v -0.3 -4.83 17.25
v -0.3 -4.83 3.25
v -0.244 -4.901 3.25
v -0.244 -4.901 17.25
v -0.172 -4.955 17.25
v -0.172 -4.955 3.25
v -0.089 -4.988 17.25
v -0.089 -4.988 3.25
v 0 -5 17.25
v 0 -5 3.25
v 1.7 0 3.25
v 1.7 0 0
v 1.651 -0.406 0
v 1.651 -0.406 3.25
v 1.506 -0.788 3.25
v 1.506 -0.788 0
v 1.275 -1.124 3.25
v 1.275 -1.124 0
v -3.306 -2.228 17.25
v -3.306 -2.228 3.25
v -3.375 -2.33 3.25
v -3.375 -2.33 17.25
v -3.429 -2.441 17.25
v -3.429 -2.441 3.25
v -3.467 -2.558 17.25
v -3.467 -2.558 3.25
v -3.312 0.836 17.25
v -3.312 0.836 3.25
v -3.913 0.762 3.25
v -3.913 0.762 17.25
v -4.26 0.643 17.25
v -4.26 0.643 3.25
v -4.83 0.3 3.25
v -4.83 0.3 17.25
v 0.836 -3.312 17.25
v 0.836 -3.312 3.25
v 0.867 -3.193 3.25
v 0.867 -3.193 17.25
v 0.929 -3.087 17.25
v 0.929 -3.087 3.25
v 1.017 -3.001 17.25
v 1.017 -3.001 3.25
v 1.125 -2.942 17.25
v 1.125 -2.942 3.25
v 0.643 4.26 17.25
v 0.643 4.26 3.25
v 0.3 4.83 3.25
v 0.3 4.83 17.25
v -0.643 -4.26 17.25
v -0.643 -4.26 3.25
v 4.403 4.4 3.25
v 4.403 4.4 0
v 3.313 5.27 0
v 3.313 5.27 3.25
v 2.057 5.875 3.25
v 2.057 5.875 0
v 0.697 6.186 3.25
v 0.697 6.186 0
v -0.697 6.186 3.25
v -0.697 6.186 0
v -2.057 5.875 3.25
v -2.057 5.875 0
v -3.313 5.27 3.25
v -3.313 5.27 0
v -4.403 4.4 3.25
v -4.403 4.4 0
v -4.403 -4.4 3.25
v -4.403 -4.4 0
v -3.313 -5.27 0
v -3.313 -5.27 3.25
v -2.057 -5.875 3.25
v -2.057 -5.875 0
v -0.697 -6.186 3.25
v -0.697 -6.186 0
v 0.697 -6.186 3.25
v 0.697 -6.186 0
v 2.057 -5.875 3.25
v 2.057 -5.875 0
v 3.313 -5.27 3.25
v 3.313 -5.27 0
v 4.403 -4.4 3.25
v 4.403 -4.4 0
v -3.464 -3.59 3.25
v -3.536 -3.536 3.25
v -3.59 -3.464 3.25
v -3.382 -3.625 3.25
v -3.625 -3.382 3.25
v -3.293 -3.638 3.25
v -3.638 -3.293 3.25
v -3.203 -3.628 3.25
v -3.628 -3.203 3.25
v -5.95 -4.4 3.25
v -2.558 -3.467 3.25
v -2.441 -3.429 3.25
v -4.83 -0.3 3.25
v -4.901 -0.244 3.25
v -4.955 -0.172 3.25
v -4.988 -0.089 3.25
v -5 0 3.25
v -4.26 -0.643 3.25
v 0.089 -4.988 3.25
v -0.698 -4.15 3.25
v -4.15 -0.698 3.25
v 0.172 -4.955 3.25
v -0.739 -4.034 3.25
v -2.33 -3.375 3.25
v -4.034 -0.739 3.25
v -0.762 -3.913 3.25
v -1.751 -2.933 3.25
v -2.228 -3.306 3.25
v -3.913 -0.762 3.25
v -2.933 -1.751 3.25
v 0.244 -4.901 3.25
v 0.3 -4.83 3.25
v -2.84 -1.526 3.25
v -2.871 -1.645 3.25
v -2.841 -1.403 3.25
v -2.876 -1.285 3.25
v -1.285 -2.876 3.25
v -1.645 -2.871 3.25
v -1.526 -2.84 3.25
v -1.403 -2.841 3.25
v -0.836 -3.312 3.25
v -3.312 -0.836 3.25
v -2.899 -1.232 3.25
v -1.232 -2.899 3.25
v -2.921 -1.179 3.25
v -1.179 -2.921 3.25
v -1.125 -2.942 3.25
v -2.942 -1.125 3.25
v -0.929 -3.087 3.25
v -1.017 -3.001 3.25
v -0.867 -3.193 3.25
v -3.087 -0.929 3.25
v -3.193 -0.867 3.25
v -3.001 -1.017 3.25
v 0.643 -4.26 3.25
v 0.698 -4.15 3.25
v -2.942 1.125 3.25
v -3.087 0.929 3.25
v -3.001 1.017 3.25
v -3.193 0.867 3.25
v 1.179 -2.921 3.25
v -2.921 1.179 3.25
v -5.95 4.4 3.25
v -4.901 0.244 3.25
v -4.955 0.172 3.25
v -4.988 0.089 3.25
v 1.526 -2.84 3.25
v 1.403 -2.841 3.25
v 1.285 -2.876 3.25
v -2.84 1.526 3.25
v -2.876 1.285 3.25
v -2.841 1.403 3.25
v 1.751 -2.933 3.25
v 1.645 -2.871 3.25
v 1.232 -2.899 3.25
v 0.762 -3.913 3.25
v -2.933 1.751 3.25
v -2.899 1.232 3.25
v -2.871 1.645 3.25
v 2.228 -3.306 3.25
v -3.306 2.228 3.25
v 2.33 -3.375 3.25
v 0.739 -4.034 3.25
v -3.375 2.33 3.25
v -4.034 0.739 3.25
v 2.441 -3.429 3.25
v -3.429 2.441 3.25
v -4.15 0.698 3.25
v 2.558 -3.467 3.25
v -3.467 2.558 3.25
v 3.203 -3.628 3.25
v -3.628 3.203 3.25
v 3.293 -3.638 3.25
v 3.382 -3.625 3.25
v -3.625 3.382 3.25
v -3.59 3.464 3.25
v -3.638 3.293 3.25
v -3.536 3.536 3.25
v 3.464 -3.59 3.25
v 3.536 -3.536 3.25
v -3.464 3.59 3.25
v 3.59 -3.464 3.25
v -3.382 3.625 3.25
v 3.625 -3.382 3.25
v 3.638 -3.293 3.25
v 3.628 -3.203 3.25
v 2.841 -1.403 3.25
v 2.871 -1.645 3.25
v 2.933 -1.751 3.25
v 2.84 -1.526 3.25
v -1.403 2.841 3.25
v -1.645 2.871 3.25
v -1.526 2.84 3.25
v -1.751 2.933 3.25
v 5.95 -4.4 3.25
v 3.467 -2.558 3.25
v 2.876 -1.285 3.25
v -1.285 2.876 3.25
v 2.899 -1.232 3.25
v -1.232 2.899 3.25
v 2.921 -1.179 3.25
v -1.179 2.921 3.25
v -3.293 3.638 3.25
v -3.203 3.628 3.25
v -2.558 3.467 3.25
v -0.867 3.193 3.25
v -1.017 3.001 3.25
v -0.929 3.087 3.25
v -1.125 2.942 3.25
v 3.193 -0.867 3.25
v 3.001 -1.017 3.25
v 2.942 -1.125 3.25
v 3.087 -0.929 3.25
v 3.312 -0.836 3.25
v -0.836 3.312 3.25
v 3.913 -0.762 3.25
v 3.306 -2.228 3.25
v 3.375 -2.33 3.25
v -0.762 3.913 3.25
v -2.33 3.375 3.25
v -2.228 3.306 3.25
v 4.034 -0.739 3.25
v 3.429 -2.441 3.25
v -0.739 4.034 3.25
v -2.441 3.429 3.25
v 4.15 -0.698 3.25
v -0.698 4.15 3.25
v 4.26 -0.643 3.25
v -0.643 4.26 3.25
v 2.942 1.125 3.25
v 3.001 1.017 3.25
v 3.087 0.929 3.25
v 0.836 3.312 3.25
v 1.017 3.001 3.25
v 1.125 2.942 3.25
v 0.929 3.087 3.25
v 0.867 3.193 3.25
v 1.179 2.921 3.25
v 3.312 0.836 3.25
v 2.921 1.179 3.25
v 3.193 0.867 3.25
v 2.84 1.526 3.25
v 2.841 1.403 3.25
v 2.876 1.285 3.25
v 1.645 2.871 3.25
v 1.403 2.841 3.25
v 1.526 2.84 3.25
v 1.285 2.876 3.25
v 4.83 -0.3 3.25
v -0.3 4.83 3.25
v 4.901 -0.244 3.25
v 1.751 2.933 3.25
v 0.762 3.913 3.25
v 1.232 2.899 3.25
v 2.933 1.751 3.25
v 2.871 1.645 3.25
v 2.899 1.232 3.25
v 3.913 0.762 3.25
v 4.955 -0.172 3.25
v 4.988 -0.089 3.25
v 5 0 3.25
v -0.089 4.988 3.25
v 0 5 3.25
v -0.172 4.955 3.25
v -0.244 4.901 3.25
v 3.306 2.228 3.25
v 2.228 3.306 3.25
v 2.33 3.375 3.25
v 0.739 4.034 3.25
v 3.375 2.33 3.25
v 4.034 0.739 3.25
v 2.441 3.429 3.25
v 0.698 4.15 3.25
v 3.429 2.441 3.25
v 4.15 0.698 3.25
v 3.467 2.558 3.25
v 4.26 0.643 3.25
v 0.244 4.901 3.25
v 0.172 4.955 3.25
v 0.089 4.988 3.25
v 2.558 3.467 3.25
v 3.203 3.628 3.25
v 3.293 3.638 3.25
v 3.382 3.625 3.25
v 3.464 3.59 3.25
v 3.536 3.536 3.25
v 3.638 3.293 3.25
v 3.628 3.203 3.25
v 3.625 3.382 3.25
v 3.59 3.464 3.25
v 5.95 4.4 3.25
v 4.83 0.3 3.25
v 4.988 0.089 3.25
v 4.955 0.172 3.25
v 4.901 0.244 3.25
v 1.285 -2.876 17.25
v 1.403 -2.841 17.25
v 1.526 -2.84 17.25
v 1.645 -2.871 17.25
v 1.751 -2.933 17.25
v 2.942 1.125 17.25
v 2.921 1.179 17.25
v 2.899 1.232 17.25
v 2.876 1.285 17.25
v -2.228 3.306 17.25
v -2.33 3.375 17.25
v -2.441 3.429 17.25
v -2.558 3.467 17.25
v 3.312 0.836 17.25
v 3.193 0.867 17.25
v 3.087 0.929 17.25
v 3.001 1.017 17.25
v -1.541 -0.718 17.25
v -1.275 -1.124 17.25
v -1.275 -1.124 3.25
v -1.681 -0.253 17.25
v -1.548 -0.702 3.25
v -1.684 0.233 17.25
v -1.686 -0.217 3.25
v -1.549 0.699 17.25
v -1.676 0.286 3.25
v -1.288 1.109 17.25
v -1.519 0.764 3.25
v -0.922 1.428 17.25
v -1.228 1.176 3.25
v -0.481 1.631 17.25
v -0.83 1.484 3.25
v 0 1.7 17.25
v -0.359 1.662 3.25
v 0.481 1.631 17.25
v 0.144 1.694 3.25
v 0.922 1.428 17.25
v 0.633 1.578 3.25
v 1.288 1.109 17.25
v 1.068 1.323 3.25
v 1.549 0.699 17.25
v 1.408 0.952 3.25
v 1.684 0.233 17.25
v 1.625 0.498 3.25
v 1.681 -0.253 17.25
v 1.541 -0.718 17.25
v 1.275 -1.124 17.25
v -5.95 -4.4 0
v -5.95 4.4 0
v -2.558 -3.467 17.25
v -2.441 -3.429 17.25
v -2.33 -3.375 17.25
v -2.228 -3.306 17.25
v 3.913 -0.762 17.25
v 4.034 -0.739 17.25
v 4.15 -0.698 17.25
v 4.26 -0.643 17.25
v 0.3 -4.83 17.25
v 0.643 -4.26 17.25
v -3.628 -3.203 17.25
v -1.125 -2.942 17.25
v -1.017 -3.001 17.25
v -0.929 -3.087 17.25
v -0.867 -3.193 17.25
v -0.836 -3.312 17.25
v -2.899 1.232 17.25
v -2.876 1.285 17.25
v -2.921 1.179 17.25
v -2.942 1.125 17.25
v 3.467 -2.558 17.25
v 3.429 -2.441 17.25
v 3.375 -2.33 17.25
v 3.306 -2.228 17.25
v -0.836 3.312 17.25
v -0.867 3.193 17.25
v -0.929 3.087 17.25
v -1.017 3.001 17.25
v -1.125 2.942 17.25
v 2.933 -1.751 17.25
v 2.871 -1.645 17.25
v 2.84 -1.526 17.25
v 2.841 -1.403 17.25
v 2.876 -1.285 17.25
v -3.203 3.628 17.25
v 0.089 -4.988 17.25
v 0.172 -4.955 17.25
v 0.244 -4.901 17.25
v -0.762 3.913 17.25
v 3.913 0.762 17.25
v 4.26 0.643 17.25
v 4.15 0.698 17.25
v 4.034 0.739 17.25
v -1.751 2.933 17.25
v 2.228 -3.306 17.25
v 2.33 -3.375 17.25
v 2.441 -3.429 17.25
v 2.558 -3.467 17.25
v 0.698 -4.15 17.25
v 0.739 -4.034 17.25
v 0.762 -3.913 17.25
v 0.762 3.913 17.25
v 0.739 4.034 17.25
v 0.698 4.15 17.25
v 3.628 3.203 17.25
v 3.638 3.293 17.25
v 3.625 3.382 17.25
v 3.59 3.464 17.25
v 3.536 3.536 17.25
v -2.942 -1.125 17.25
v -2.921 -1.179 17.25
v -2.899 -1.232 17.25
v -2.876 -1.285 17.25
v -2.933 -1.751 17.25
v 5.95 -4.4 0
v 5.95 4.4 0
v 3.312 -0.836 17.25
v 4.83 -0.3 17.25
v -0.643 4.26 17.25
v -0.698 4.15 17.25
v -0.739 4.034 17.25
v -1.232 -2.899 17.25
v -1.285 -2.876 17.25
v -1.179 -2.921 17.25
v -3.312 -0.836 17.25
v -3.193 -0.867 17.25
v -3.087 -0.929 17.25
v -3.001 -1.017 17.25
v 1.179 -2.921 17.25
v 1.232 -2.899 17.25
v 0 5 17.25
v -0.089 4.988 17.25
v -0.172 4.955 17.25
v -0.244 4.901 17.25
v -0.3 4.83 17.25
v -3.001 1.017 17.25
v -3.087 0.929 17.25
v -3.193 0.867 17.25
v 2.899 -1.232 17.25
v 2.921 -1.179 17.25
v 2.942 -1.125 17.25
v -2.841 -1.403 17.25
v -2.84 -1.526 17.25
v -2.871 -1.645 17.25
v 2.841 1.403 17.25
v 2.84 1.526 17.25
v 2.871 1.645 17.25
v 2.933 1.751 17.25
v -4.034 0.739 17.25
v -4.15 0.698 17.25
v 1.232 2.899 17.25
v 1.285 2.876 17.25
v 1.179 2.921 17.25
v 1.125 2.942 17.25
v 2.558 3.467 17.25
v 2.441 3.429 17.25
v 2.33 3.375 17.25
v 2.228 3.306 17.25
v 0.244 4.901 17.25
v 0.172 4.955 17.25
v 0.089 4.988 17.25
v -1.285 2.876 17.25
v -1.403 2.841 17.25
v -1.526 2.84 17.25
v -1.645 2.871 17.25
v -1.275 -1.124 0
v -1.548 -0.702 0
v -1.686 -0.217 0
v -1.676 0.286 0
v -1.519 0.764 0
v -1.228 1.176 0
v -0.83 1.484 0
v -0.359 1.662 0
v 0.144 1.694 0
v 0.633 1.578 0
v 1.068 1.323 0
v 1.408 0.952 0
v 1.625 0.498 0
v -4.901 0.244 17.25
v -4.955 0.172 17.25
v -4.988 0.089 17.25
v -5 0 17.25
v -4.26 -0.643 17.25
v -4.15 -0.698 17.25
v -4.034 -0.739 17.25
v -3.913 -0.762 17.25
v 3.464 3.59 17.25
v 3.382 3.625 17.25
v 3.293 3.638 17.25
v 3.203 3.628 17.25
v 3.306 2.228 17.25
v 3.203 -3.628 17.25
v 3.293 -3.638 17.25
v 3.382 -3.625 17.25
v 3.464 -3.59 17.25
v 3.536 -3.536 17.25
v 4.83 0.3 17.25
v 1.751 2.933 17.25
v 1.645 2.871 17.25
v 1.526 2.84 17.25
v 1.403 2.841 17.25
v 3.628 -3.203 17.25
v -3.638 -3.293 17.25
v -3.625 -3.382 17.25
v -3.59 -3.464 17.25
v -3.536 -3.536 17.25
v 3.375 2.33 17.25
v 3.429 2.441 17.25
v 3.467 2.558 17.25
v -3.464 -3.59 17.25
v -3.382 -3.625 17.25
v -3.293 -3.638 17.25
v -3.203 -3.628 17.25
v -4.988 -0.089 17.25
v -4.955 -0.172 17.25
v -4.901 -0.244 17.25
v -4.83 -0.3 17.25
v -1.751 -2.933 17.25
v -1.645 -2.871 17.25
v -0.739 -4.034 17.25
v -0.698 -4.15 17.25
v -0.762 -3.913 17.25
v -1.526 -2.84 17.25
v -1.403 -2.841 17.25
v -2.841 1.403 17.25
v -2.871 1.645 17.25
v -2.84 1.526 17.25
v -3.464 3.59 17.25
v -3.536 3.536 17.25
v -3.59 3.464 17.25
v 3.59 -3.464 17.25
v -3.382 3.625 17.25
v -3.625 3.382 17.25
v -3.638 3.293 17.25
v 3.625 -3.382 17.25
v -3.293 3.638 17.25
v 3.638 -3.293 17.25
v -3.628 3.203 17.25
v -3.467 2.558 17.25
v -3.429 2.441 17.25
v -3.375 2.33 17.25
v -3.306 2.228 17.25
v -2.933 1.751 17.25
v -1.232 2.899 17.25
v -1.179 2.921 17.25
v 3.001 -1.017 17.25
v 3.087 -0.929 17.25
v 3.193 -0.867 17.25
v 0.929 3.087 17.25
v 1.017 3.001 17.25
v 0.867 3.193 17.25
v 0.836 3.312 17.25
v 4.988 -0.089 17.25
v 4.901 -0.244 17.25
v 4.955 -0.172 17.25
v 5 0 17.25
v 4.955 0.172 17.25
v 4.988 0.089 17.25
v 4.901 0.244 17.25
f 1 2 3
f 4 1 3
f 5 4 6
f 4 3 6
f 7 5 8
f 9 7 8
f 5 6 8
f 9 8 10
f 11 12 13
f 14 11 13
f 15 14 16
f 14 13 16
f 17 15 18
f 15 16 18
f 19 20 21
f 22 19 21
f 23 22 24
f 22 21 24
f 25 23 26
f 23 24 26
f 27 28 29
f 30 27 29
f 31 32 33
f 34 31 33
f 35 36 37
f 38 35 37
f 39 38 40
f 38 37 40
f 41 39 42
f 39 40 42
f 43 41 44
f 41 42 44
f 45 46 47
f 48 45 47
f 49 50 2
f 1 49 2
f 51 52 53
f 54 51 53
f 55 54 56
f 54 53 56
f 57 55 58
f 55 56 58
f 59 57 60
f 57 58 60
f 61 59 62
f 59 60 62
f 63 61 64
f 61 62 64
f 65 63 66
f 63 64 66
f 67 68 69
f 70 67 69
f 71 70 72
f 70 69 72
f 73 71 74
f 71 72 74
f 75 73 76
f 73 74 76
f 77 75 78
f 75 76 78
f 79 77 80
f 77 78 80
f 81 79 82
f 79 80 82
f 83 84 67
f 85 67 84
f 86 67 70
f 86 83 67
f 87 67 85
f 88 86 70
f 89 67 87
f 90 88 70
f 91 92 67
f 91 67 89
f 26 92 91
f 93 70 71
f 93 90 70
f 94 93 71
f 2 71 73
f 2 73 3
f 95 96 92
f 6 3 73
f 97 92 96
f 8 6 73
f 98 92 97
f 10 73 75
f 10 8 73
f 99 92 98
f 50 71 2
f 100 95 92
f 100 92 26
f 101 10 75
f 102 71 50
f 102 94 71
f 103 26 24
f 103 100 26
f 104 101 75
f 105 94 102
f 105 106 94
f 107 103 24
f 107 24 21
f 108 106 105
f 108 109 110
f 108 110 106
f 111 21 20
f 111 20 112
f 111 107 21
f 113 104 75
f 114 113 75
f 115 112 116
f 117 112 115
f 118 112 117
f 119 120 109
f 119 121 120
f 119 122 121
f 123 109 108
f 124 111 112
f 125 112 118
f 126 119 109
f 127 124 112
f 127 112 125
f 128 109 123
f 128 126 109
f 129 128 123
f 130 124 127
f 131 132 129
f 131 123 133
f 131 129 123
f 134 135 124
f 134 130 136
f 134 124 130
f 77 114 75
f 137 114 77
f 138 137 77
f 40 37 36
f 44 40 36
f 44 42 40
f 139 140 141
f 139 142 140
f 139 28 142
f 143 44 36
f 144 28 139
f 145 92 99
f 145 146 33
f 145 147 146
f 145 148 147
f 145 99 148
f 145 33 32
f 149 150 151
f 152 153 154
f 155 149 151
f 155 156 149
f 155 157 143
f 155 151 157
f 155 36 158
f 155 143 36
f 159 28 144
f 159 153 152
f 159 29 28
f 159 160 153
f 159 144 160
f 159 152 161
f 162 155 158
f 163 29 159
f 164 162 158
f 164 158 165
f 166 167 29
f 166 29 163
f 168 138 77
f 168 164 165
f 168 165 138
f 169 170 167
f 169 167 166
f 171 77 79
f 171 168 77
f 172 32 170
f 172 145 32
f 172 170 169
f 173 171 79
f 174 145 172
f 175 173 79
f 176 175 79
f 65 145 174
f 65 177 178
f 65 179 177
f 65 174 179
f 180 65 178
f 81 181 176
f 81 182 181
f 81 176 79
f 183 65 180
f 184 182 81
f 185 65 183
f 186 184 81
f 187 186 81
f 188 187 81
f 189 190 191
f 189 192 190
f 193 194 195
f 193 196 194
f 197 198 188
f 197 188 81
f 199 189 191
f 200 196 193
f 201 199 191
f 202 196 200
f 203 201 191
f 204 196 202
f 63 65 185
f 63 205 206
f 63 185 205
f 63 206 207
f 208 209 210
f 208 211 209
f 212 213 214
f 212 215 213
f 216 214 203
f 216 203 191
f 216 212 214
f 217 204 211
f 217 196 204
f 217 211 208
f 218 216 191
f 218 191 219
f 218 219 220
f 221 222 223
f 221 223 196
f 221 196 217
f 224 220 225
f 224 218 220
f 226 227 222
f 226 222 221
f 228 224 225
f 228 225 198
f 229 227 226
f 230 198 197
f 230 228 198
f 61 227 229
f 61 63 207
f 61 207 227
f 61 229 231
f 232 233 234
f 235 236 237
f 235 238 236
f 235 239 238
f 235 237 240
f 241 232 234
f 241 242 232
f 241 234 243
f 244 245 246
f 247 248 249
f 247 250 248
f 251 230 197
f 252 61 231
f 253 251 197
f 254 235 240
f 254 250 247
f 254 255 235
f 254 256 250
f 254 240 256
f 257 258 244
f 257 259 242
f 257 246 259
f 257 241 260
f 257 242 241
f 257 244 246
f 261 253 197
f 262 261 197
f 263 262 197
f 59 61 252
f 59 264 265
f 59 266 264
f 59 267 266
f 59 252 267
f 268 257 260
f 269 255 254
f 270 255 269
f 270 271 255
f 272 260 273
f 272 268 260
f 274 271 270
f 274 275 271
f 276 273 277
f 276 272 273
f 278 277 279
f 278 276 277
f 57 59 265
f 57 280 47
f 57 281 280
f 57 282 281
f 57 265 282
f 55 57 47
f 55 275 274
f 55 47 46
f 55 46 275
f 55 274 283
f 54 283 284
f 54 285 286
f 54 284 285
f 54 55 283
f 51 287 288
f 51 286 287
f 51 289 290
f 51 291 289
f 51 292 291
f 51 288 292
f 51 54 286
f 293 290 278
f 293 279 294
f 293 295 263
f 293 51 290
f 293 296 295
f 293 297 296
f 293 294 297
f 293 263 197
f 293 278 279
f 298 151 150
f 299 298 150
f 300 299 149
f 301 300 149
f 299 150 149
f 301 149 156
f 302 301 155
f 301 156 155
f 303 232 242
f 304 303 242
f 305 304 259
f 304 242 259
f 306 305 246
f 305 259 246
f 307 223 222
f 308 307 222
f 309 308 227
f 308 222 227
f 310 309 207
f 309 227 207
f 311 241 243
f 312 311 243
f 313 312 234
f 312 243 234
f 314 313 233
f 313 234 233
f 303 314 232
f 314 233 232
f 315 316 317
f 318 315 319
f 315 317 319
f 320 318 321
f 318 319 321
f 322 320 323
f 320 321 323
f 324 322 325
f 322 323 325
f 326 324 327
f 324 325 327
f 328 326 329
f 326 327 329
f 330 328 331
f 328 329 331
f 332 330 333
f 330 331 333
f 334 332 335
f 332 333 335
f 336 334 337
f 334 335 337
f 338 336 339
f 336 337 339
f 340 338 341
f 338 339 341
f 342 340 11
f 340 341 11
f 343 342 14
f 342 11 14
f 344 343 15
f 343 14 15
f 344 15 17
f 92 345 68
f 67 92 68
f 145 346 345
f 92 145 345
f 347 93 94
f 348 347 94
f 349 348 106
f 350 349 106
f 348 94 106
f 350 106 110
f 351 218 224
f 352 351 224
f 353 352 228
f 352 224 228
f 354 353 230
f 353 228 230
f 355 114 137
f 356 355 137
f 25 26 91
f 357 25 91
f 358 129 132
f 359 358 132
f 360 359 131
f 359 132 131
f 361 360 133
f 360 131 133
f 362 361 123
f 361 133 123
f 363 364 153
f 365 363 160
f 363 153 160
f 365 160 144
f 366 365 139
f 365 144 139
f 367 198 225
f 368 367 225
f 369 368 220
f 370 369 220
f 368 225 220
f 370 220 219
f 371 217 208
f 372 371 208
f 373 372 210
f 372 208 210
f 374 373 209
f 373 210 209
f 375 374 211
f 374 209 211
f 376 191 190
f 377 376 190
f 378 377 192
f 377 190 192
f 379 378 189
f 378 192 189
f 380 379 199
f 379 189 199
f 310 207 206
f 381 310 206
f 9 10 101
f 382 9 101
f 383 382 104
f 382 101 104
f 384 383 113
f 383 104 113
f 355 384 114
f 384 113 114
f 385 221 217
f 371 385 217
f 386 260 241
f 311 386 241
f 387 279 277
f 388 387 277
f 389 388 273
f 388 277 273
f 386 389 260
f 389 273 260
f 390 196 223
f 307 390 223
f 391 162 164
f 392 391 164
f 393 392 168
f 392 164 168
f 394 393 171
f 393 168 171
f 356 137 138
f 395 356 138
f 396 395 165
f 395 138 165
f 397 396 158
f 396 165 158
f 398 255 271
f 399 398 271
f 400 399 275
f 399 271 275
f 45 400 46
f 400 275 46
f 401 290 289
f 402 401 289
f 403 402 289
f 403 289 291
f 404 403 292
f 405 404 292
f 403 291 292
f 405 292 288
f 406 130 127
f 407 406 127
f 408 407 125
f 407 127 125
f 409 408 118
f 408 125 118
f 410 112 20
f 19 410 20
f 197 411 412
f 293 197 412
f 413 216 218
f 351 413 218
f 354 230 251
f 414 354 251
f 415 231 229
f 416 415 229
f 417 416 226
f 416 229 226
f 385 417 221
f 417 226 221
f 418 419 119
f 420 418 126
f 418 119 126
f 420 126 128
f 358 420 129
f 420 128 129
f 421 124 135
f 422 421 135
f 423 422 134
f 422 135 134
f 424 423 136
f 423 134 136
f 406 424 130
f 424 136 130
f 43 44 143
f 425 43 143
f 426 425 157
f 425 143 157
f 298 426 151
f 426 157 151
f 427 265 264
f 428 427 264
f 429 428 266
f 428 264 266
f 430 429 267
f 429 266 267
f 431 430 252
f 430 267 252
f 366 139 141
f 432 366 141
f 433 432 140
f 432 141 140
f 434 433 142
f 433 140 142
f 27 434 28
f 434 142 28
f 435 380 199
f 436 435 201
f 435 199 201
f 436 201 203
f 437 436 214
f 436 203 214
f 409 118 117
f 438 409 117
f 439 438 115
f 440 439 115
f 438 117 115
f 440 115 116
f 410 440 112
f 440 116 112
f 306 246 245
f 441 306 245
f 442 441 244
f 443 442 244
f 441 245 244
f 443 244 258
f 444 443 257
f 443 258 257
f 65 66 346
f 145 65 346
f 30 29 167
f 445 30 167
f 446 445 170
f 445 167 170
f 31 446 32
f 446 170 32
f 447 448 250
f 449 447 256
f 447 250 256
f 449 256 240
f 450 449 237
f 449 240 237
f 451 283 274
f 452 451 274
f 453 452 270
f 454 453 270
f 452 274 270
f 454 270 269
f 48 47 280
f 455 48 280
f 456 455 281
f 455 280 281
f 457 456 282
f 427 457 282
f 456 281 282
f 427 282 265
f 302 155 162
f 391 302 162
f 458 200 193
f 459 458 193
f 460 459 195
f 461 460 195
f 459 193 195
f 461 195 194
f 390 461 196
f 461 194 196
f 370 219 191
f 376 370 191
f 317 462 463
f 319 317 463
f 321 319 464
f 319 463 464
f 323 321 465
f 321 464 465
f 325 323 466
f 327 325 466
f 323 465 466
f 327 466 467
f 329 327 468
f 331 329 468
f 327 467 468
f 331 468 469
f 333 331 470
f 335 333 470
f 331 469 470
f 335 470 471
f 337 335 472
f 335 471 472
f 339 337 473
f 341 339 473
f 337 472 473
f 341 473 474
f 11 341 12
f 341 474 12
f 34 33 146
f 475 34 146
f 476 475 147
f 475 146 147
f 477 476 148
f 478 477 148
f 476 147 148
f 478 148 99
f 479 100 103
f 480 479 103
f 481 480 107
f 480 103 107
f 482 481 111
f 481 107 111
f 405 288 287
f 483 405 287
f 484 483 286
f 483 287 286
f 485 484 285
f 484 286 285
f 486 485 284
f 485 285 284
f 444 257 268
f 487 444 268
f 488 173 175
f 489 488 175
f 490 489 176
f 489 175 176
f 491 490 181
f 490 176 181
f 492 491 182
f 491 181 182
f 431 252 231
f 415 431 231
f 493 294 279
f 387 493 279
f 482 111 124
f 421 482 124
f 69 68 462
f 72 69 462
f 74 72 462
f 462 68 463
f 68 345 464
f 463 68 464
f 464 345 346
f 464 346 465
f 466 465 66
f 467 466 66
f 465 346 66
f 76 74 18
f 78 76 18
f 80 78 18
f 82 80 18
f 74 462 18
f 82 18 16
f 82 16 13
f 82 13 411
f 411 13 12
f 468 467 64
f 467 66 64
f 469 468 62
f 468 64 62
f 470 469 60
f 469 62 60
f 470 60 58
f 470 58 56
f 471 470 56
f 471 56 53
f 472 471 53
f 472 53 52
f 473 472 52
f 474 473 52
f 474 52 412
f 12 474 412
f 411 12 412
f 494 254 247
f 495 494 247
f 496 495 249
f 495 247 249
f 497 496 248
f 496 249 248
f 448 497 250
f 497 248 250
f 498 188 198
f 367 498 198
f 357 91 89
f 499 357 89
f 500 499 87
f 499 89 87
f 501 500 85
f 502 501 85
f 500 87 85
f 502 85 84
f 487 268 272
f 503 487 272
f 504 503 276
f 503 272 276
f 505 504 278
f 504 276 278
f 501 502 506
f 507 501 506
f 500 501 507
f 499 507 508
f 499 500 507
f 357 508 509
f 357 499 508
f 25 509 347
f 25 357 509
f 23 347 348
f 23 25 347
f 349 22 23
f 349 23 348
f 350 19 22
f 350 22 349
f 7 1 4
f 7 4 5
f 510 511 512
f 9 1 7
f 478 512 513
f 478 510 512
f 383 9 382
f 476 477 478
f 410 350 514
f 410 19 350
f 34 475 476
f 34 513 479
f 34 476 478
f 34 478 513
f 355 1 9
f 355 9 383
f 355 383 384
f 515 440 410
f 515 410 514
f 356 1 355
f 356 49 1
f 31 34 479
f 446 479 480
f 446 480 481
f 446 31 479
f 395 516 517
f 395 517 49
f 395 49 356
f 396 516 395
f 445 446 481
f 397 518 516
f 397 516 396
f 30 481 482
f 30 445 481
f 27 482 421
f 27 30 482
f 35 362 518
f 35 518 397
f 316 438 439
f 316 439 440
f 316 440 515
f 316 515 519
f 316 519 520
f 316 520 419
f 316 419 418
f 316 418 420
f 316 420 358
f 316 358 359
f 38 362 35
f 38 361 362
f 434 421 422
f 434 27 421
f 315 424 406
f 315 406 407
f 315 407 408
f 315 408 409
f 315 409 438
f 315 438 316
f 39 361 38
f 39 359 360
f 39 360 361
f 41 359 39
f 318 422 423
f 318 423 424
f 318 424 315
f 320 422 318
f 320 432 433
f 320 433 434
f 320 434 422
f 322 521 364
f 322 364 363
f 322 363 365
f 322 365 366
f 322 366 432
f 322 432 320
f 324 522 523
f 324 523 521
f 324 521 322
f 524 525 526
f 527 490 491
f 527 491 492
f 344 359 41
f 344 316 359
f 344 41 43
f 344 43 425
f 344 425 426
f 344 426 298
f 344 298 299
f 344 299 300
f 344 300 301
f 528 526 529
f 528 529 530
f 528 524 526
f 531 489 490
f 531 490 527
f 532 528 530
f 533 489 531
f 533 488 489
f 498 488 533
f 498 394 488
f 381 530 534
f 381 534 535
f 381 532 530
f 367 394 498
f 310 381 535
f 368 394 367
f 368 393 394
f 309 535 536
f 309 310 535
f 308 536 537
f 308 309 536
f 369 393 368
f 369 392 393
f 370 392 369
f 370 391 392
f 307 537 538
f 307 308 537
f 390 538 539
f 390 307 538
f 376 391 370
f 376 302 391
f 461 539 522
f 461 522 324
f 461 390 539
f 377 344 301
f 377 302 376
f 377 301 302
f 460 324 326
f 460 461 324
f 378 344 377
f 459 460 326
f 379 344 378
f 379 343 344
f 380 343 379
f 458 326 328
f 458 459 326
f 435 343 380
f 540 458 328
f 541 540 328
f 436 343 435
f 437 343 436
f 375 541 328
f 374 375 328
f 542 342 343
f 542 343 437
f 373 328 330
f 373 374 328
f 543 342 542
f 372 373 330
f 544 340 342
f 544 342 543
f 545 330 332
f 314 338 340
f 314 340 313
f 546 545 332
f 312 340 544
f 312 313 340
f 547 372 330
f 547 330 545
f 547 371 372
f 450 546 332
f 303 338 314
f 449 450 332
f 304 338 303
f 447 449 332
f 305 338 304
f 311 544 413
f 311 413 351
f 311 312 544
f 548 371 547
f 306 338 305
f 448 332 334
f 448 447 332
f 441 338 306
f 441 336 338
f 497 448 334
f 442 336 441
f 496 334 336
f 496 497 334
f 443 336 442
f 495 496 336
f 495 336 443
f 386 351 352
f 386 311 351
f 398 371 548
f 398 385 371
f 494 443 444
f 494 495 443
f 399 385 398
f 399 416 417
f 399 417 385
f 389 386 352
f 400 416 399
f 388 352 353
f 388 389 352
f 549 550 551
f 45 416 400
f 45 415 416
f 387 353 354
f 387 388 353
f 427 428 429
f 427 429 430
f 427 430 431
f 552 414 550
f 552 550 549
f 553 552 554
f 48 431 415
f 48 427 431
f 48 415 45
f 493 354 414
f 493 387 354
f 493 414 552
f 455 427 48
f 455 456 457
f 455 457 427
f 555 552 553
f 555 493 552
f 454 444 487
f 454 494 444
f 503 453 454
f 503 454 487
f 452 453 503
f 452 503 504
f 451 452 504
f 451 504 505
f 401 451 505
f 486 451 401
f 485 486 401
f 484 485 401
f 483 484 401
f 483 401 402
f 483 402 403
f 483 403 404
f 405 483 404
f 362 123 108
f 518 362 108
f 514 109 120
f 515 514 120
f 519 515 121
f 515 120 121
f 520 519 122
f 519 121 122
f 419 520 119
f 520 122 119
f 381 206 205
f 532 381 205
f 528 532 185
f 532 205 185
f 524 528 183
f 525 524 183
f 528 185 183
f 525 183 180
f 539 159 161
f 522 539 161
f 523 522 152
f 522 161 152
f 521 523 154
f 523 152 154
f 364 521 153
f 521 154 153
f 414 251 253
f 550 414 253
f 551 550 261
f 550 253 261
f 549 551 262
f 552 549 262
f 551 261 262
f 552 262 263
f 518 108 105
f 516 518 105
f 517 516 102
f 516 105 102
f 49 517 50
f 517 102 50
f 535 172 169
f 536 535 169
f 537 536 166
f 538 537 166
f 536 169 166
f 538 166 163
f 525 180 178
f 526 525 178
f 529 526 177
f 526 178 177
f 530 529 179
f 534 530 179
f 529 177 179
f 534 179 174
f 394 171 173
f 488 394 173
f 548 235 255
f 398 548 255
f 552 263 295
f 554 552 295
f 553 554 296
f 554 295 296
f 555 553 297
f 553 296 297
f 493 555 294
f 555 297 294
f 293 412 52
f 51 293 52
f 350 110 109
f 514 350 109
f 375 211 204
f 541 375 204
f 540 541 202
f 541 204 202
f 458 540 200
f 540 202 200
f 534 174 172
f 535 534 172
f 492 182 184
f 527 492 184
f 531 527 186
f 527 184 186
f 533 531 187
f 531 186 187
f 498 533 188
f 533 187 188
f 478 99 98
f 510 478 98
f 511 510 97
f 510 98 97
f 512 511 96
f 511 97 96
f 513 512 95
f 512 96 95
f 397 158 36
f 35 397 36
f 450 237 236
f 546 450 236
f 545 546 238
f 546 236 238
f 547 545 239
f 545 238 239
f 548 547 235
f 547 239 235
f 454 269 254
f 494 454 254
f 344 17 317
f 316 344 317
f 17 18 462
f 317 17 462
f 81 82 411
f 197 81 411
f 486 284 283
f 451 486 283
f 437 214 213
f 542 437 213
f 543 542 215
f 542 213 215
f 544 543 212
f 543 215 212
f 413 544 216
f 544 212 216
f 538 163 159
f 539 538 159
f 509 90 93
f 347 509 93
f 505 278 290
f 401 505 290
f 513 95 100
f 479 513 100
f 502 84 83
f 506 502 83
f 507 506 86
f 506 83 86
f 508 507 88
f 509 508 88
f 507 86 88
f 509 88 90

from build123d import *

# Parameters (mm, degrees)
F0_R     = 5
F0_R_2   = 3.15
F0_R_3   = 2.55
F1_DEPTH = 3.25
F2_R     = 2.55
F3_DEPTH = 14


# Not quite as in the source:
# - a feature names something its author has since deleted; it is built from what else it names


with BuildPart() as f1:
    # F0 (on Top) → F1 (new body)
    with BuildSketch(Plane.XY):
        with BuildLine():
            Line((-5.95, -4.4), (-4.4034787385, -4.4))
            ThreePointArc((-4.4034787385, -4.4), (0, -6.225), (4.4034787385, -4.4))
            Line((4.4034787385, -4.4), (5.95, -4.4))
            Line((5.95, -4.4), (5.95, 4.4))
            Line((5.95, 4.4), (4.4034787385, 4.4))
            ThreePointArc((4.4034787385, 4.4), (0, 6.225), (-4.4034787385, 4.4))
            Line((-4.4034787385, 4.4), (-5.95, 4.4))
            Line((-5.95, 4.4), (-5.95, -4.4))
        make_face()
        Circle(F0_R, mode=Mode.SUBTRACT)
        Circle(F0_R)
        Circle(F0_R_2, mode=Mode.SUBTRACT)
        Circle(F0_R_2)
        Circle(F0_R_3, mode=Mode.SUBTRACT)
        Circle(F0_R_3)
        with BuildLine():
            ThreePointArc((-1.275, -1.1244443072), (-0.601040764, 1.5902043894), (1.7, 0))
            ThreePointArc((1.7, 0), (1.5902043894, -0.601040764), (1.275, -1.1244443072))
            ThreePointArc((1.275, -1.1244443072), (0, -1.7), (-1.275, -1.1244443072))
        make_face(mode=Mode.SUBTRACT)
        with BuildLine():
            Line((1.275, -1.1244443072), (-1.275, -1.1244443072))
            ThreePointArc((-1.275, -1.1244443072), (0, -1.7), (1.275, -1.1244443072))
        make_face()
    extrude(amount=F1_DEPTH)

    # F2 (on face) → F3 (join)
    with BuildSketch(Plane.XY.offset(3.25)):
        with BuildLine():
            ThreePointArc((-4.8302633262, 0.3000085552), (-4.9546244936, 0.172348246), (-5, 0))
            ThreePointArc((-5, 0), (-4.9546244936, -0.172348246), (-4.8302633262, -0.3000085552))
            Line((-4.8302633262, -0.3000085552), (-4.2601369618, -0.6425750355))
            ThreePointArc((-4.2601369618, -0.6425750355), (-4.0929165173, -0.7205512094), (-3.9131380826, -0.7620563314))
            Line((-3.9131380826, -0.7620563314), (-3.3117988826, -0.835891501))
            ThreePointArc((-3.3117988826, -0.835891501), (-3.0868883315, -0.9291389359), (-2.9422567869, -1.125))
            ThreePointArc((-2.9422567869, -1.125), (-3.15, 0), (-2.9422567869, 1.125))
            ThreePointArc((-2.9422567869, 1.125), (-3.0868883315, 0.9291389359), (-3.3117988826, 0.835891501))
            Line((-3.3117988826, 0.835891501), (-3.9131380826, 0.7620563314))
            ThreePointArc((-3.9131380826, 0.7620563314), (-4.0929165173, 0.7205512094), (-4.2601369618, 0.6425750355))
            Line((-4.2601369618, 0.6425750355), (-4.8302633262, 0.3000085552))
        make_face()
        with BuildLine():
            ThreePointArc((-3.2033738691, 3.6276500367), (-3.3815799641, 3.6253171911), (-3.5355339059, 3.5355339059))
            ThreePointArc((-3.5355339059, 3.5355339059), (-3.6253171911, 3.3815799641), (-3.6276500367, 3.2033738691))
            Line((-3.6276500367, 3.2033738691), (-3.4667408995, 2.5580025694))
            ThreePointArc((-3.4667408995, 2.5580025694), (-3.4036356706, 2.3846223779), (-3.3058616735, 2.2281512744))
            Line((-3.3058616735, 2.2281512744), (-2.9328599965, 1.7507308991))
            ThreePointArc((-2.9328599965, 1.7507308991), (-2.8397601142, 1.5257592297), (-2.8759848548, 1.2849945972))
            ThreePointArc((-2.8759848548, 1.2849945972), (-2.2273863607, 2.2273863607), (-1.2849945972, 2.8759848548))
            ThreePointArc((-1.2849945972, 2.8759848548), (-1.5257592297, 2.8397601142), (-1.7507308991, 2.9328599965))
            Line((-1.7507308991, 2.9328599965), (-2.2281512744, 3.3058616735))
            ThreePointArc((-2.2281512744, 3.3058616735), (-2.3846223779, 3.4036356706), (-2.5580025694, 3.4667408995))
            Line((-2.5580025694, 3.4667408995), (-3.2033738691, 3.6276500367))
        make_face()
        with BuildLine():
            ThreePointArc((0.3000085552, 4.8302633262), (0.172348246, 4.9546244936), (0, 5))
            ThreePointArc((0, 5), (-0.172348246, 4.9546244936), (-0.3000085552, 4.8302633262))
            Line((-0.3000085552, 4.8302633262), (-0.6425750355, 4.2601369618))
            ThreePointArc((-0.6425750355, 4.2601369618), (-0.7205512094, 4.0929165173), (-0.7620563314, 3.9131380826))
            Line((-0.7620563314, 3.9131380826), (-0.835891501, 3.3117988826))
            ThreePointArc((-0.835891501, 3.3117988826), (-0.9291389359, 3.0868883315), (-1.125, 2.9422567869))
            ThreePointArc((-1.125, 2.9422567869), (0, 3.15), (1.125, 2.9422567869))
            ThreePointArc((1.125, 2.9422567869), (0.9291389359, 3.0868883315), (0.835891501, 3.3117988826))
            Line((0.835891501, 3.3117988826), (0.7620563314, 3.9131380826))
            ThreePointArc((0.7620563314, 3.9131380826), (0.7205512094, 4.0929165173), (0.6425750355, 4.2601369618))
            Line((0.6425750355, 4.2601369618), (0.3000085552, 4.8302633262))
        make_face()
        with BuildLine():
            ThreePointArc((3.2033738691, -3.6276500367), (3.3815799667, -3.6253171904), (3.5355339096, -3.5355339023))
            ThreePointArc((3.5355339096, -3.5355339023), (3.6253171918, -3.3815799616), (3.6276500367, -3.2033738691))
            Line((3.6276500367, -3.2033738691), (3.4667408995, -2.5580025694))
            ThreePointArc((3.4667408995, -2.5580025694), (3.4036356706, -2.3846223779), (3.3058616735, -2.2281512744))
            Line((3.3058616735, -2.2281512744), (2.9328599965, -1.7507308991))
            ThreePointArc((2.9328599965, -1.7507308991), (2.8397601142, -1.5257592297), (2.8759848548, -1.2849945972))
            ThreePointArc((2.8759848548, -1.2849945972), (2.2273863607, -2.2273863607), (1.2849945972, -2.8759848548))
            ThreePointArc((1.2849945972, -2.8759848548), (1.5257592297, -2.8397601142), (1.7507308991, -2.9328599965))
            Line((1.7507308991, -2.9328599965), (2.2281512744, -3.3058616735))
            ThreePointArc((2.2281512744, -3.3058616735), (2.3846223779, -3.4036356706), (2.5580025694, -3.4667408995))
            Line((2.5580025694, -3.4667408995), (3.2033738691, -3.6276500367))
        make_face()
        with BuildLine():
            ThreePointArc((-0.3000085552, -4.8302633262), (-0.172348246, -4.9546244936), (0, -5))
            ThreePointArc((0, -5), (0.172348246, -4.9546244936), (0.3000085552, -4.8302633262))
            Line((0.3000085552, -4.8302633262), (0.6425750355, -4.2601369618))
            ThreePointArc((0.6425750355, -4.2601369618), (0.7205512094, -4.0929165173), (0.7620563314, -3.9131380826))
            Line((0.7620563314, -3.9131380826), (0.835891501, -3.3117988826))
            ThreePointArc((0.835891501, -3.3117988826), (0.9291389359, -3.0868883315), (1.125, -2.9422567869))
            ThreePointArc((1.125, -2.9422567869), (0, -3.15), (-1.125, -2.9422567869))
            ThreePointArc((-1.125, -2.9422567869), (-0.9291389359, -3.0868883315), (-0.835891501, -3.3117988826))
            Line((-0.835891501, -3.3117988826), (-0.7620563314, -3.9131380826))
            ThreePointArc((-0.7620563314, -3.9131380826), (-0.7205512094, -4.0929165173), (-0.6425750355, -4.2601369618))
            Line((-0.6425750355, -4.2601369618), (-0.3000085552, -4.8302633262))
        make_face()
        with BuildLine():
            ThreePointArc((-3.6276500367, -3.2033738691), (-3.6253171911, -3.3815799641), (-3.5355339059, -3.5355339059))
            ThreePointArc((-3.5355339059, -3.5355339059), (-3.3815799641, -3.6253171911), (-3.2033738691, -3.6276500367))
            Line((-3.2033738691, -3.6276500367), (-2.5580025694, -3.4667408995))
            ThreePointArc((-2.5580025694, -3.4667408995), (-2.3846223779, -3.4036356706), (-2.2281512744, -3.3058616735))
            Line((-2.2281512744, -3.3058616735), (-1.7507308991, -2.9328599965))
            ThreePointArc((-1.7507308991, -2.9328599965), (-1.5257592297, -2.8397601142), (-1.2849945972, -2.8759848548))
            ThreePointArc((-1.2849945972, -2.8759848548), (-2.2273863607, -2.2273863607), (-2.8759848548, -1.2849945972))
            ThreePointArc((-2.8759848548, -1.2849945972), (-2.8397601142, -1.5257592297), (-2.9328599965, -1.7507308991))
            Line((-2.9328599965, -1.7507308991), (-3.3058616735, -2.2281512744))
            ThreePointArc((-3.3058616735, -2.2281512744), (-3.4036356706, -2.3846223779), (-3.4667408995, -2.5580025694))
            Line((-3.4667408995, -2.5580025694), (-3.6276500367, -3.2033738691))
        make_face()
        with BuildLine():
            ThreePointArc((2.8759848548, -1.2849945972), (2.9102205274, -1.205452812), (2.9422567869, -1.125))
            ThreePointArc((2.9422567869, -1.125), (3.0976288414, -0.5720101054), (3.15, 0))
            ThreePointArc((3.15, 0), (3.0976288414, 0.5720101054), (2.9422567869, 1.125))
            ThreePointArc((2.9422567869, 1.125), (2.9102205274, 1.205452812), (2.8759848548, 1.2849945972))
            ThreePointArc((2.8759848548, 1.2849945972), (2.2273863607, 2.2273863607), (1.2849945972, 2.8759848548))
            ThreePointArc((1.2849945972, 2.8759848548), (1.205452812, 2.9102205274), (1.125, 2.9422567869))
            ThreePointArc((1.125, 2.9422567869), (0, 3.15), (-1.125, 2.9422567869))
            ThreePointArc((-1.125, 2.9422567869), (-1.205452812, 2.9102205274), (-1.2849945972, 2.8759848548))
            ThreePointArc((-1.2849945972, 2.8759848548), (-2.2273863607, 2.2273863607), (-2.8759848548, 1.2849945972))
            ThreePointArc((-2.8759848548, 1.2849945972), (-2.9102205274, 1.205452812), (-2.9422567869, 1.125))
            ThreePointArc((-2.9422567869, 1.125), (-3.15, 0), (-2.9422567869, -1.125))
            ThreePointArc((-2.9422567869, -1.125), (-2.9102205274, -1.205452812), (-2.8759848548, -1.2849945972))
            ThreePointArc((-2.8759848548, -1.2849945972), (-2.2273863607, -2.2273863607), (-1.2849945972, -2.8759848548))
            ThreePointArc((-1.2849945972, -2.8759848548), (-1.205452812, -2.9102205274), (-1.125, -2.9422567869))
            ThreePointArc((-1.125, -2.9422567869), (0, -3.15), (1.125, -2.9422567869))
            ThreePointArc((1.125, -2.9422567869), (1.205452812, -2.9102205274), (1.2849945972, -2.8759848548))
            ThreePointArc((1.2849945972, -2.8759848548), (2.2273863607, -2.2273863607), (2.8759848548, -1.2849945972))
        make_face()
        Circle(F2_R, mode=Mode.SUBTRACT)
        Circle(F2_R)
        with BuildLine():
            Line((1.275, -1.1244443072), (-1.275, -1.1244443072))
            ThreePointArc((-1.275, -1.1244443072), (0, 1.7), (1.275, -1.1244443072))
        make_face(mode=Mode.SUBTRACT)
        with BuildLine():
            ThreePointArc((3.6276500367, 3.2033738691), (3.6253171915, 3.3815799629), (3.5355339078, 3.5355339041))
            ThreePointArc((3.5355339078, 3.5355339041), (3.3815799654, 3.6253171908), (3.2033738691, 3.6276500367))
            Line((3.2033738691, 3.6276500367), (2.5580025694, 3.4667408995))
            ThreePointArc((2.5580025694, 3.4667408995), (2.3846223779, 3.4036356706), (2.2281512744, 3.3058616735))
            Line((2.2281512744, 3.3058616735), (1.7507308991, 2.9328599965))
            ThreePointArc((1.7507308991, 2.9328599965), (1.5257592297, 2.8397601142), (1.2849945972, 2.8759848548))
            ThreePointArc((1.2849945972, 2.8759848548), (2.2273863607, 2.2273863607), (2.8759848548, 1.2849945972))
            ThreePointArc((2.8759848548, 1.2849945972), (2.8397601142, 1.5257592297), (2.9328599965, 1.7507308991))
            Line((2.9328599965, 1.7507308991), (3.3058616735, 2.2281512744))
            ThreePointArc((3.3058616735, 2.2281512744), (3.4036356706, 2.3846223779), (3.4667408995, 2.5580025694))
            Line((3.4667408995, 2.5580025694), (3.6276500367, 3.2033738691))
        make_face()
        with BuildLine():
            ThreePointArc((4.8302633262, -0.3000085552), (4.9546244936, -0.172348246), (5, 0))
            ThreePointArc((5, 0), (4.9546244936, 0.172348246), (4.8302633262, 0.3000085552))
            Line((4.8302633262, 0.3000085552), (4.2601369618, 0.6425750355))
            ThreePointArc((4.2601369618, 0.6425750355), (4.0929165173, 0.7205512094), (3.9131380826, 0.7620563314))
            Line((3.9131380826, 0.7620563314), (3.3117988826, 0.835891501))
            ThreePointArc((3.3117988826, 0.835891501), (3.0868883315, 0.9291389359), (2.9422567869, 1.125))
            ThreePointArc((2.9422567869, 1.125), (3.0976288414, 0.5720101054), (3.15, 0))
            ThreePointArc((3.15, 0), (3.0976288414, -0.5720101054), (2.9422567869, -1.125))
            ThreePointArc((2.9422567869, -1.125), (3.0868883315, -0.9291389359), (3.3117988826, -0.835891501))
            Line((3.3117988826, -0.835891501), (3.9131380826, -0.7620563314))
            ThreePointArc((3.9131380826, -0.7620563314), (4.0929165173, -0.7205512094), (4.2601369618, -0.6425750355))
            Line((4.2601369618, -0.6425750355), (4.8302633262, -0.3000085552))
        make_face()
    extrude(amount=F3_DEPTH)


solid = f1.part
